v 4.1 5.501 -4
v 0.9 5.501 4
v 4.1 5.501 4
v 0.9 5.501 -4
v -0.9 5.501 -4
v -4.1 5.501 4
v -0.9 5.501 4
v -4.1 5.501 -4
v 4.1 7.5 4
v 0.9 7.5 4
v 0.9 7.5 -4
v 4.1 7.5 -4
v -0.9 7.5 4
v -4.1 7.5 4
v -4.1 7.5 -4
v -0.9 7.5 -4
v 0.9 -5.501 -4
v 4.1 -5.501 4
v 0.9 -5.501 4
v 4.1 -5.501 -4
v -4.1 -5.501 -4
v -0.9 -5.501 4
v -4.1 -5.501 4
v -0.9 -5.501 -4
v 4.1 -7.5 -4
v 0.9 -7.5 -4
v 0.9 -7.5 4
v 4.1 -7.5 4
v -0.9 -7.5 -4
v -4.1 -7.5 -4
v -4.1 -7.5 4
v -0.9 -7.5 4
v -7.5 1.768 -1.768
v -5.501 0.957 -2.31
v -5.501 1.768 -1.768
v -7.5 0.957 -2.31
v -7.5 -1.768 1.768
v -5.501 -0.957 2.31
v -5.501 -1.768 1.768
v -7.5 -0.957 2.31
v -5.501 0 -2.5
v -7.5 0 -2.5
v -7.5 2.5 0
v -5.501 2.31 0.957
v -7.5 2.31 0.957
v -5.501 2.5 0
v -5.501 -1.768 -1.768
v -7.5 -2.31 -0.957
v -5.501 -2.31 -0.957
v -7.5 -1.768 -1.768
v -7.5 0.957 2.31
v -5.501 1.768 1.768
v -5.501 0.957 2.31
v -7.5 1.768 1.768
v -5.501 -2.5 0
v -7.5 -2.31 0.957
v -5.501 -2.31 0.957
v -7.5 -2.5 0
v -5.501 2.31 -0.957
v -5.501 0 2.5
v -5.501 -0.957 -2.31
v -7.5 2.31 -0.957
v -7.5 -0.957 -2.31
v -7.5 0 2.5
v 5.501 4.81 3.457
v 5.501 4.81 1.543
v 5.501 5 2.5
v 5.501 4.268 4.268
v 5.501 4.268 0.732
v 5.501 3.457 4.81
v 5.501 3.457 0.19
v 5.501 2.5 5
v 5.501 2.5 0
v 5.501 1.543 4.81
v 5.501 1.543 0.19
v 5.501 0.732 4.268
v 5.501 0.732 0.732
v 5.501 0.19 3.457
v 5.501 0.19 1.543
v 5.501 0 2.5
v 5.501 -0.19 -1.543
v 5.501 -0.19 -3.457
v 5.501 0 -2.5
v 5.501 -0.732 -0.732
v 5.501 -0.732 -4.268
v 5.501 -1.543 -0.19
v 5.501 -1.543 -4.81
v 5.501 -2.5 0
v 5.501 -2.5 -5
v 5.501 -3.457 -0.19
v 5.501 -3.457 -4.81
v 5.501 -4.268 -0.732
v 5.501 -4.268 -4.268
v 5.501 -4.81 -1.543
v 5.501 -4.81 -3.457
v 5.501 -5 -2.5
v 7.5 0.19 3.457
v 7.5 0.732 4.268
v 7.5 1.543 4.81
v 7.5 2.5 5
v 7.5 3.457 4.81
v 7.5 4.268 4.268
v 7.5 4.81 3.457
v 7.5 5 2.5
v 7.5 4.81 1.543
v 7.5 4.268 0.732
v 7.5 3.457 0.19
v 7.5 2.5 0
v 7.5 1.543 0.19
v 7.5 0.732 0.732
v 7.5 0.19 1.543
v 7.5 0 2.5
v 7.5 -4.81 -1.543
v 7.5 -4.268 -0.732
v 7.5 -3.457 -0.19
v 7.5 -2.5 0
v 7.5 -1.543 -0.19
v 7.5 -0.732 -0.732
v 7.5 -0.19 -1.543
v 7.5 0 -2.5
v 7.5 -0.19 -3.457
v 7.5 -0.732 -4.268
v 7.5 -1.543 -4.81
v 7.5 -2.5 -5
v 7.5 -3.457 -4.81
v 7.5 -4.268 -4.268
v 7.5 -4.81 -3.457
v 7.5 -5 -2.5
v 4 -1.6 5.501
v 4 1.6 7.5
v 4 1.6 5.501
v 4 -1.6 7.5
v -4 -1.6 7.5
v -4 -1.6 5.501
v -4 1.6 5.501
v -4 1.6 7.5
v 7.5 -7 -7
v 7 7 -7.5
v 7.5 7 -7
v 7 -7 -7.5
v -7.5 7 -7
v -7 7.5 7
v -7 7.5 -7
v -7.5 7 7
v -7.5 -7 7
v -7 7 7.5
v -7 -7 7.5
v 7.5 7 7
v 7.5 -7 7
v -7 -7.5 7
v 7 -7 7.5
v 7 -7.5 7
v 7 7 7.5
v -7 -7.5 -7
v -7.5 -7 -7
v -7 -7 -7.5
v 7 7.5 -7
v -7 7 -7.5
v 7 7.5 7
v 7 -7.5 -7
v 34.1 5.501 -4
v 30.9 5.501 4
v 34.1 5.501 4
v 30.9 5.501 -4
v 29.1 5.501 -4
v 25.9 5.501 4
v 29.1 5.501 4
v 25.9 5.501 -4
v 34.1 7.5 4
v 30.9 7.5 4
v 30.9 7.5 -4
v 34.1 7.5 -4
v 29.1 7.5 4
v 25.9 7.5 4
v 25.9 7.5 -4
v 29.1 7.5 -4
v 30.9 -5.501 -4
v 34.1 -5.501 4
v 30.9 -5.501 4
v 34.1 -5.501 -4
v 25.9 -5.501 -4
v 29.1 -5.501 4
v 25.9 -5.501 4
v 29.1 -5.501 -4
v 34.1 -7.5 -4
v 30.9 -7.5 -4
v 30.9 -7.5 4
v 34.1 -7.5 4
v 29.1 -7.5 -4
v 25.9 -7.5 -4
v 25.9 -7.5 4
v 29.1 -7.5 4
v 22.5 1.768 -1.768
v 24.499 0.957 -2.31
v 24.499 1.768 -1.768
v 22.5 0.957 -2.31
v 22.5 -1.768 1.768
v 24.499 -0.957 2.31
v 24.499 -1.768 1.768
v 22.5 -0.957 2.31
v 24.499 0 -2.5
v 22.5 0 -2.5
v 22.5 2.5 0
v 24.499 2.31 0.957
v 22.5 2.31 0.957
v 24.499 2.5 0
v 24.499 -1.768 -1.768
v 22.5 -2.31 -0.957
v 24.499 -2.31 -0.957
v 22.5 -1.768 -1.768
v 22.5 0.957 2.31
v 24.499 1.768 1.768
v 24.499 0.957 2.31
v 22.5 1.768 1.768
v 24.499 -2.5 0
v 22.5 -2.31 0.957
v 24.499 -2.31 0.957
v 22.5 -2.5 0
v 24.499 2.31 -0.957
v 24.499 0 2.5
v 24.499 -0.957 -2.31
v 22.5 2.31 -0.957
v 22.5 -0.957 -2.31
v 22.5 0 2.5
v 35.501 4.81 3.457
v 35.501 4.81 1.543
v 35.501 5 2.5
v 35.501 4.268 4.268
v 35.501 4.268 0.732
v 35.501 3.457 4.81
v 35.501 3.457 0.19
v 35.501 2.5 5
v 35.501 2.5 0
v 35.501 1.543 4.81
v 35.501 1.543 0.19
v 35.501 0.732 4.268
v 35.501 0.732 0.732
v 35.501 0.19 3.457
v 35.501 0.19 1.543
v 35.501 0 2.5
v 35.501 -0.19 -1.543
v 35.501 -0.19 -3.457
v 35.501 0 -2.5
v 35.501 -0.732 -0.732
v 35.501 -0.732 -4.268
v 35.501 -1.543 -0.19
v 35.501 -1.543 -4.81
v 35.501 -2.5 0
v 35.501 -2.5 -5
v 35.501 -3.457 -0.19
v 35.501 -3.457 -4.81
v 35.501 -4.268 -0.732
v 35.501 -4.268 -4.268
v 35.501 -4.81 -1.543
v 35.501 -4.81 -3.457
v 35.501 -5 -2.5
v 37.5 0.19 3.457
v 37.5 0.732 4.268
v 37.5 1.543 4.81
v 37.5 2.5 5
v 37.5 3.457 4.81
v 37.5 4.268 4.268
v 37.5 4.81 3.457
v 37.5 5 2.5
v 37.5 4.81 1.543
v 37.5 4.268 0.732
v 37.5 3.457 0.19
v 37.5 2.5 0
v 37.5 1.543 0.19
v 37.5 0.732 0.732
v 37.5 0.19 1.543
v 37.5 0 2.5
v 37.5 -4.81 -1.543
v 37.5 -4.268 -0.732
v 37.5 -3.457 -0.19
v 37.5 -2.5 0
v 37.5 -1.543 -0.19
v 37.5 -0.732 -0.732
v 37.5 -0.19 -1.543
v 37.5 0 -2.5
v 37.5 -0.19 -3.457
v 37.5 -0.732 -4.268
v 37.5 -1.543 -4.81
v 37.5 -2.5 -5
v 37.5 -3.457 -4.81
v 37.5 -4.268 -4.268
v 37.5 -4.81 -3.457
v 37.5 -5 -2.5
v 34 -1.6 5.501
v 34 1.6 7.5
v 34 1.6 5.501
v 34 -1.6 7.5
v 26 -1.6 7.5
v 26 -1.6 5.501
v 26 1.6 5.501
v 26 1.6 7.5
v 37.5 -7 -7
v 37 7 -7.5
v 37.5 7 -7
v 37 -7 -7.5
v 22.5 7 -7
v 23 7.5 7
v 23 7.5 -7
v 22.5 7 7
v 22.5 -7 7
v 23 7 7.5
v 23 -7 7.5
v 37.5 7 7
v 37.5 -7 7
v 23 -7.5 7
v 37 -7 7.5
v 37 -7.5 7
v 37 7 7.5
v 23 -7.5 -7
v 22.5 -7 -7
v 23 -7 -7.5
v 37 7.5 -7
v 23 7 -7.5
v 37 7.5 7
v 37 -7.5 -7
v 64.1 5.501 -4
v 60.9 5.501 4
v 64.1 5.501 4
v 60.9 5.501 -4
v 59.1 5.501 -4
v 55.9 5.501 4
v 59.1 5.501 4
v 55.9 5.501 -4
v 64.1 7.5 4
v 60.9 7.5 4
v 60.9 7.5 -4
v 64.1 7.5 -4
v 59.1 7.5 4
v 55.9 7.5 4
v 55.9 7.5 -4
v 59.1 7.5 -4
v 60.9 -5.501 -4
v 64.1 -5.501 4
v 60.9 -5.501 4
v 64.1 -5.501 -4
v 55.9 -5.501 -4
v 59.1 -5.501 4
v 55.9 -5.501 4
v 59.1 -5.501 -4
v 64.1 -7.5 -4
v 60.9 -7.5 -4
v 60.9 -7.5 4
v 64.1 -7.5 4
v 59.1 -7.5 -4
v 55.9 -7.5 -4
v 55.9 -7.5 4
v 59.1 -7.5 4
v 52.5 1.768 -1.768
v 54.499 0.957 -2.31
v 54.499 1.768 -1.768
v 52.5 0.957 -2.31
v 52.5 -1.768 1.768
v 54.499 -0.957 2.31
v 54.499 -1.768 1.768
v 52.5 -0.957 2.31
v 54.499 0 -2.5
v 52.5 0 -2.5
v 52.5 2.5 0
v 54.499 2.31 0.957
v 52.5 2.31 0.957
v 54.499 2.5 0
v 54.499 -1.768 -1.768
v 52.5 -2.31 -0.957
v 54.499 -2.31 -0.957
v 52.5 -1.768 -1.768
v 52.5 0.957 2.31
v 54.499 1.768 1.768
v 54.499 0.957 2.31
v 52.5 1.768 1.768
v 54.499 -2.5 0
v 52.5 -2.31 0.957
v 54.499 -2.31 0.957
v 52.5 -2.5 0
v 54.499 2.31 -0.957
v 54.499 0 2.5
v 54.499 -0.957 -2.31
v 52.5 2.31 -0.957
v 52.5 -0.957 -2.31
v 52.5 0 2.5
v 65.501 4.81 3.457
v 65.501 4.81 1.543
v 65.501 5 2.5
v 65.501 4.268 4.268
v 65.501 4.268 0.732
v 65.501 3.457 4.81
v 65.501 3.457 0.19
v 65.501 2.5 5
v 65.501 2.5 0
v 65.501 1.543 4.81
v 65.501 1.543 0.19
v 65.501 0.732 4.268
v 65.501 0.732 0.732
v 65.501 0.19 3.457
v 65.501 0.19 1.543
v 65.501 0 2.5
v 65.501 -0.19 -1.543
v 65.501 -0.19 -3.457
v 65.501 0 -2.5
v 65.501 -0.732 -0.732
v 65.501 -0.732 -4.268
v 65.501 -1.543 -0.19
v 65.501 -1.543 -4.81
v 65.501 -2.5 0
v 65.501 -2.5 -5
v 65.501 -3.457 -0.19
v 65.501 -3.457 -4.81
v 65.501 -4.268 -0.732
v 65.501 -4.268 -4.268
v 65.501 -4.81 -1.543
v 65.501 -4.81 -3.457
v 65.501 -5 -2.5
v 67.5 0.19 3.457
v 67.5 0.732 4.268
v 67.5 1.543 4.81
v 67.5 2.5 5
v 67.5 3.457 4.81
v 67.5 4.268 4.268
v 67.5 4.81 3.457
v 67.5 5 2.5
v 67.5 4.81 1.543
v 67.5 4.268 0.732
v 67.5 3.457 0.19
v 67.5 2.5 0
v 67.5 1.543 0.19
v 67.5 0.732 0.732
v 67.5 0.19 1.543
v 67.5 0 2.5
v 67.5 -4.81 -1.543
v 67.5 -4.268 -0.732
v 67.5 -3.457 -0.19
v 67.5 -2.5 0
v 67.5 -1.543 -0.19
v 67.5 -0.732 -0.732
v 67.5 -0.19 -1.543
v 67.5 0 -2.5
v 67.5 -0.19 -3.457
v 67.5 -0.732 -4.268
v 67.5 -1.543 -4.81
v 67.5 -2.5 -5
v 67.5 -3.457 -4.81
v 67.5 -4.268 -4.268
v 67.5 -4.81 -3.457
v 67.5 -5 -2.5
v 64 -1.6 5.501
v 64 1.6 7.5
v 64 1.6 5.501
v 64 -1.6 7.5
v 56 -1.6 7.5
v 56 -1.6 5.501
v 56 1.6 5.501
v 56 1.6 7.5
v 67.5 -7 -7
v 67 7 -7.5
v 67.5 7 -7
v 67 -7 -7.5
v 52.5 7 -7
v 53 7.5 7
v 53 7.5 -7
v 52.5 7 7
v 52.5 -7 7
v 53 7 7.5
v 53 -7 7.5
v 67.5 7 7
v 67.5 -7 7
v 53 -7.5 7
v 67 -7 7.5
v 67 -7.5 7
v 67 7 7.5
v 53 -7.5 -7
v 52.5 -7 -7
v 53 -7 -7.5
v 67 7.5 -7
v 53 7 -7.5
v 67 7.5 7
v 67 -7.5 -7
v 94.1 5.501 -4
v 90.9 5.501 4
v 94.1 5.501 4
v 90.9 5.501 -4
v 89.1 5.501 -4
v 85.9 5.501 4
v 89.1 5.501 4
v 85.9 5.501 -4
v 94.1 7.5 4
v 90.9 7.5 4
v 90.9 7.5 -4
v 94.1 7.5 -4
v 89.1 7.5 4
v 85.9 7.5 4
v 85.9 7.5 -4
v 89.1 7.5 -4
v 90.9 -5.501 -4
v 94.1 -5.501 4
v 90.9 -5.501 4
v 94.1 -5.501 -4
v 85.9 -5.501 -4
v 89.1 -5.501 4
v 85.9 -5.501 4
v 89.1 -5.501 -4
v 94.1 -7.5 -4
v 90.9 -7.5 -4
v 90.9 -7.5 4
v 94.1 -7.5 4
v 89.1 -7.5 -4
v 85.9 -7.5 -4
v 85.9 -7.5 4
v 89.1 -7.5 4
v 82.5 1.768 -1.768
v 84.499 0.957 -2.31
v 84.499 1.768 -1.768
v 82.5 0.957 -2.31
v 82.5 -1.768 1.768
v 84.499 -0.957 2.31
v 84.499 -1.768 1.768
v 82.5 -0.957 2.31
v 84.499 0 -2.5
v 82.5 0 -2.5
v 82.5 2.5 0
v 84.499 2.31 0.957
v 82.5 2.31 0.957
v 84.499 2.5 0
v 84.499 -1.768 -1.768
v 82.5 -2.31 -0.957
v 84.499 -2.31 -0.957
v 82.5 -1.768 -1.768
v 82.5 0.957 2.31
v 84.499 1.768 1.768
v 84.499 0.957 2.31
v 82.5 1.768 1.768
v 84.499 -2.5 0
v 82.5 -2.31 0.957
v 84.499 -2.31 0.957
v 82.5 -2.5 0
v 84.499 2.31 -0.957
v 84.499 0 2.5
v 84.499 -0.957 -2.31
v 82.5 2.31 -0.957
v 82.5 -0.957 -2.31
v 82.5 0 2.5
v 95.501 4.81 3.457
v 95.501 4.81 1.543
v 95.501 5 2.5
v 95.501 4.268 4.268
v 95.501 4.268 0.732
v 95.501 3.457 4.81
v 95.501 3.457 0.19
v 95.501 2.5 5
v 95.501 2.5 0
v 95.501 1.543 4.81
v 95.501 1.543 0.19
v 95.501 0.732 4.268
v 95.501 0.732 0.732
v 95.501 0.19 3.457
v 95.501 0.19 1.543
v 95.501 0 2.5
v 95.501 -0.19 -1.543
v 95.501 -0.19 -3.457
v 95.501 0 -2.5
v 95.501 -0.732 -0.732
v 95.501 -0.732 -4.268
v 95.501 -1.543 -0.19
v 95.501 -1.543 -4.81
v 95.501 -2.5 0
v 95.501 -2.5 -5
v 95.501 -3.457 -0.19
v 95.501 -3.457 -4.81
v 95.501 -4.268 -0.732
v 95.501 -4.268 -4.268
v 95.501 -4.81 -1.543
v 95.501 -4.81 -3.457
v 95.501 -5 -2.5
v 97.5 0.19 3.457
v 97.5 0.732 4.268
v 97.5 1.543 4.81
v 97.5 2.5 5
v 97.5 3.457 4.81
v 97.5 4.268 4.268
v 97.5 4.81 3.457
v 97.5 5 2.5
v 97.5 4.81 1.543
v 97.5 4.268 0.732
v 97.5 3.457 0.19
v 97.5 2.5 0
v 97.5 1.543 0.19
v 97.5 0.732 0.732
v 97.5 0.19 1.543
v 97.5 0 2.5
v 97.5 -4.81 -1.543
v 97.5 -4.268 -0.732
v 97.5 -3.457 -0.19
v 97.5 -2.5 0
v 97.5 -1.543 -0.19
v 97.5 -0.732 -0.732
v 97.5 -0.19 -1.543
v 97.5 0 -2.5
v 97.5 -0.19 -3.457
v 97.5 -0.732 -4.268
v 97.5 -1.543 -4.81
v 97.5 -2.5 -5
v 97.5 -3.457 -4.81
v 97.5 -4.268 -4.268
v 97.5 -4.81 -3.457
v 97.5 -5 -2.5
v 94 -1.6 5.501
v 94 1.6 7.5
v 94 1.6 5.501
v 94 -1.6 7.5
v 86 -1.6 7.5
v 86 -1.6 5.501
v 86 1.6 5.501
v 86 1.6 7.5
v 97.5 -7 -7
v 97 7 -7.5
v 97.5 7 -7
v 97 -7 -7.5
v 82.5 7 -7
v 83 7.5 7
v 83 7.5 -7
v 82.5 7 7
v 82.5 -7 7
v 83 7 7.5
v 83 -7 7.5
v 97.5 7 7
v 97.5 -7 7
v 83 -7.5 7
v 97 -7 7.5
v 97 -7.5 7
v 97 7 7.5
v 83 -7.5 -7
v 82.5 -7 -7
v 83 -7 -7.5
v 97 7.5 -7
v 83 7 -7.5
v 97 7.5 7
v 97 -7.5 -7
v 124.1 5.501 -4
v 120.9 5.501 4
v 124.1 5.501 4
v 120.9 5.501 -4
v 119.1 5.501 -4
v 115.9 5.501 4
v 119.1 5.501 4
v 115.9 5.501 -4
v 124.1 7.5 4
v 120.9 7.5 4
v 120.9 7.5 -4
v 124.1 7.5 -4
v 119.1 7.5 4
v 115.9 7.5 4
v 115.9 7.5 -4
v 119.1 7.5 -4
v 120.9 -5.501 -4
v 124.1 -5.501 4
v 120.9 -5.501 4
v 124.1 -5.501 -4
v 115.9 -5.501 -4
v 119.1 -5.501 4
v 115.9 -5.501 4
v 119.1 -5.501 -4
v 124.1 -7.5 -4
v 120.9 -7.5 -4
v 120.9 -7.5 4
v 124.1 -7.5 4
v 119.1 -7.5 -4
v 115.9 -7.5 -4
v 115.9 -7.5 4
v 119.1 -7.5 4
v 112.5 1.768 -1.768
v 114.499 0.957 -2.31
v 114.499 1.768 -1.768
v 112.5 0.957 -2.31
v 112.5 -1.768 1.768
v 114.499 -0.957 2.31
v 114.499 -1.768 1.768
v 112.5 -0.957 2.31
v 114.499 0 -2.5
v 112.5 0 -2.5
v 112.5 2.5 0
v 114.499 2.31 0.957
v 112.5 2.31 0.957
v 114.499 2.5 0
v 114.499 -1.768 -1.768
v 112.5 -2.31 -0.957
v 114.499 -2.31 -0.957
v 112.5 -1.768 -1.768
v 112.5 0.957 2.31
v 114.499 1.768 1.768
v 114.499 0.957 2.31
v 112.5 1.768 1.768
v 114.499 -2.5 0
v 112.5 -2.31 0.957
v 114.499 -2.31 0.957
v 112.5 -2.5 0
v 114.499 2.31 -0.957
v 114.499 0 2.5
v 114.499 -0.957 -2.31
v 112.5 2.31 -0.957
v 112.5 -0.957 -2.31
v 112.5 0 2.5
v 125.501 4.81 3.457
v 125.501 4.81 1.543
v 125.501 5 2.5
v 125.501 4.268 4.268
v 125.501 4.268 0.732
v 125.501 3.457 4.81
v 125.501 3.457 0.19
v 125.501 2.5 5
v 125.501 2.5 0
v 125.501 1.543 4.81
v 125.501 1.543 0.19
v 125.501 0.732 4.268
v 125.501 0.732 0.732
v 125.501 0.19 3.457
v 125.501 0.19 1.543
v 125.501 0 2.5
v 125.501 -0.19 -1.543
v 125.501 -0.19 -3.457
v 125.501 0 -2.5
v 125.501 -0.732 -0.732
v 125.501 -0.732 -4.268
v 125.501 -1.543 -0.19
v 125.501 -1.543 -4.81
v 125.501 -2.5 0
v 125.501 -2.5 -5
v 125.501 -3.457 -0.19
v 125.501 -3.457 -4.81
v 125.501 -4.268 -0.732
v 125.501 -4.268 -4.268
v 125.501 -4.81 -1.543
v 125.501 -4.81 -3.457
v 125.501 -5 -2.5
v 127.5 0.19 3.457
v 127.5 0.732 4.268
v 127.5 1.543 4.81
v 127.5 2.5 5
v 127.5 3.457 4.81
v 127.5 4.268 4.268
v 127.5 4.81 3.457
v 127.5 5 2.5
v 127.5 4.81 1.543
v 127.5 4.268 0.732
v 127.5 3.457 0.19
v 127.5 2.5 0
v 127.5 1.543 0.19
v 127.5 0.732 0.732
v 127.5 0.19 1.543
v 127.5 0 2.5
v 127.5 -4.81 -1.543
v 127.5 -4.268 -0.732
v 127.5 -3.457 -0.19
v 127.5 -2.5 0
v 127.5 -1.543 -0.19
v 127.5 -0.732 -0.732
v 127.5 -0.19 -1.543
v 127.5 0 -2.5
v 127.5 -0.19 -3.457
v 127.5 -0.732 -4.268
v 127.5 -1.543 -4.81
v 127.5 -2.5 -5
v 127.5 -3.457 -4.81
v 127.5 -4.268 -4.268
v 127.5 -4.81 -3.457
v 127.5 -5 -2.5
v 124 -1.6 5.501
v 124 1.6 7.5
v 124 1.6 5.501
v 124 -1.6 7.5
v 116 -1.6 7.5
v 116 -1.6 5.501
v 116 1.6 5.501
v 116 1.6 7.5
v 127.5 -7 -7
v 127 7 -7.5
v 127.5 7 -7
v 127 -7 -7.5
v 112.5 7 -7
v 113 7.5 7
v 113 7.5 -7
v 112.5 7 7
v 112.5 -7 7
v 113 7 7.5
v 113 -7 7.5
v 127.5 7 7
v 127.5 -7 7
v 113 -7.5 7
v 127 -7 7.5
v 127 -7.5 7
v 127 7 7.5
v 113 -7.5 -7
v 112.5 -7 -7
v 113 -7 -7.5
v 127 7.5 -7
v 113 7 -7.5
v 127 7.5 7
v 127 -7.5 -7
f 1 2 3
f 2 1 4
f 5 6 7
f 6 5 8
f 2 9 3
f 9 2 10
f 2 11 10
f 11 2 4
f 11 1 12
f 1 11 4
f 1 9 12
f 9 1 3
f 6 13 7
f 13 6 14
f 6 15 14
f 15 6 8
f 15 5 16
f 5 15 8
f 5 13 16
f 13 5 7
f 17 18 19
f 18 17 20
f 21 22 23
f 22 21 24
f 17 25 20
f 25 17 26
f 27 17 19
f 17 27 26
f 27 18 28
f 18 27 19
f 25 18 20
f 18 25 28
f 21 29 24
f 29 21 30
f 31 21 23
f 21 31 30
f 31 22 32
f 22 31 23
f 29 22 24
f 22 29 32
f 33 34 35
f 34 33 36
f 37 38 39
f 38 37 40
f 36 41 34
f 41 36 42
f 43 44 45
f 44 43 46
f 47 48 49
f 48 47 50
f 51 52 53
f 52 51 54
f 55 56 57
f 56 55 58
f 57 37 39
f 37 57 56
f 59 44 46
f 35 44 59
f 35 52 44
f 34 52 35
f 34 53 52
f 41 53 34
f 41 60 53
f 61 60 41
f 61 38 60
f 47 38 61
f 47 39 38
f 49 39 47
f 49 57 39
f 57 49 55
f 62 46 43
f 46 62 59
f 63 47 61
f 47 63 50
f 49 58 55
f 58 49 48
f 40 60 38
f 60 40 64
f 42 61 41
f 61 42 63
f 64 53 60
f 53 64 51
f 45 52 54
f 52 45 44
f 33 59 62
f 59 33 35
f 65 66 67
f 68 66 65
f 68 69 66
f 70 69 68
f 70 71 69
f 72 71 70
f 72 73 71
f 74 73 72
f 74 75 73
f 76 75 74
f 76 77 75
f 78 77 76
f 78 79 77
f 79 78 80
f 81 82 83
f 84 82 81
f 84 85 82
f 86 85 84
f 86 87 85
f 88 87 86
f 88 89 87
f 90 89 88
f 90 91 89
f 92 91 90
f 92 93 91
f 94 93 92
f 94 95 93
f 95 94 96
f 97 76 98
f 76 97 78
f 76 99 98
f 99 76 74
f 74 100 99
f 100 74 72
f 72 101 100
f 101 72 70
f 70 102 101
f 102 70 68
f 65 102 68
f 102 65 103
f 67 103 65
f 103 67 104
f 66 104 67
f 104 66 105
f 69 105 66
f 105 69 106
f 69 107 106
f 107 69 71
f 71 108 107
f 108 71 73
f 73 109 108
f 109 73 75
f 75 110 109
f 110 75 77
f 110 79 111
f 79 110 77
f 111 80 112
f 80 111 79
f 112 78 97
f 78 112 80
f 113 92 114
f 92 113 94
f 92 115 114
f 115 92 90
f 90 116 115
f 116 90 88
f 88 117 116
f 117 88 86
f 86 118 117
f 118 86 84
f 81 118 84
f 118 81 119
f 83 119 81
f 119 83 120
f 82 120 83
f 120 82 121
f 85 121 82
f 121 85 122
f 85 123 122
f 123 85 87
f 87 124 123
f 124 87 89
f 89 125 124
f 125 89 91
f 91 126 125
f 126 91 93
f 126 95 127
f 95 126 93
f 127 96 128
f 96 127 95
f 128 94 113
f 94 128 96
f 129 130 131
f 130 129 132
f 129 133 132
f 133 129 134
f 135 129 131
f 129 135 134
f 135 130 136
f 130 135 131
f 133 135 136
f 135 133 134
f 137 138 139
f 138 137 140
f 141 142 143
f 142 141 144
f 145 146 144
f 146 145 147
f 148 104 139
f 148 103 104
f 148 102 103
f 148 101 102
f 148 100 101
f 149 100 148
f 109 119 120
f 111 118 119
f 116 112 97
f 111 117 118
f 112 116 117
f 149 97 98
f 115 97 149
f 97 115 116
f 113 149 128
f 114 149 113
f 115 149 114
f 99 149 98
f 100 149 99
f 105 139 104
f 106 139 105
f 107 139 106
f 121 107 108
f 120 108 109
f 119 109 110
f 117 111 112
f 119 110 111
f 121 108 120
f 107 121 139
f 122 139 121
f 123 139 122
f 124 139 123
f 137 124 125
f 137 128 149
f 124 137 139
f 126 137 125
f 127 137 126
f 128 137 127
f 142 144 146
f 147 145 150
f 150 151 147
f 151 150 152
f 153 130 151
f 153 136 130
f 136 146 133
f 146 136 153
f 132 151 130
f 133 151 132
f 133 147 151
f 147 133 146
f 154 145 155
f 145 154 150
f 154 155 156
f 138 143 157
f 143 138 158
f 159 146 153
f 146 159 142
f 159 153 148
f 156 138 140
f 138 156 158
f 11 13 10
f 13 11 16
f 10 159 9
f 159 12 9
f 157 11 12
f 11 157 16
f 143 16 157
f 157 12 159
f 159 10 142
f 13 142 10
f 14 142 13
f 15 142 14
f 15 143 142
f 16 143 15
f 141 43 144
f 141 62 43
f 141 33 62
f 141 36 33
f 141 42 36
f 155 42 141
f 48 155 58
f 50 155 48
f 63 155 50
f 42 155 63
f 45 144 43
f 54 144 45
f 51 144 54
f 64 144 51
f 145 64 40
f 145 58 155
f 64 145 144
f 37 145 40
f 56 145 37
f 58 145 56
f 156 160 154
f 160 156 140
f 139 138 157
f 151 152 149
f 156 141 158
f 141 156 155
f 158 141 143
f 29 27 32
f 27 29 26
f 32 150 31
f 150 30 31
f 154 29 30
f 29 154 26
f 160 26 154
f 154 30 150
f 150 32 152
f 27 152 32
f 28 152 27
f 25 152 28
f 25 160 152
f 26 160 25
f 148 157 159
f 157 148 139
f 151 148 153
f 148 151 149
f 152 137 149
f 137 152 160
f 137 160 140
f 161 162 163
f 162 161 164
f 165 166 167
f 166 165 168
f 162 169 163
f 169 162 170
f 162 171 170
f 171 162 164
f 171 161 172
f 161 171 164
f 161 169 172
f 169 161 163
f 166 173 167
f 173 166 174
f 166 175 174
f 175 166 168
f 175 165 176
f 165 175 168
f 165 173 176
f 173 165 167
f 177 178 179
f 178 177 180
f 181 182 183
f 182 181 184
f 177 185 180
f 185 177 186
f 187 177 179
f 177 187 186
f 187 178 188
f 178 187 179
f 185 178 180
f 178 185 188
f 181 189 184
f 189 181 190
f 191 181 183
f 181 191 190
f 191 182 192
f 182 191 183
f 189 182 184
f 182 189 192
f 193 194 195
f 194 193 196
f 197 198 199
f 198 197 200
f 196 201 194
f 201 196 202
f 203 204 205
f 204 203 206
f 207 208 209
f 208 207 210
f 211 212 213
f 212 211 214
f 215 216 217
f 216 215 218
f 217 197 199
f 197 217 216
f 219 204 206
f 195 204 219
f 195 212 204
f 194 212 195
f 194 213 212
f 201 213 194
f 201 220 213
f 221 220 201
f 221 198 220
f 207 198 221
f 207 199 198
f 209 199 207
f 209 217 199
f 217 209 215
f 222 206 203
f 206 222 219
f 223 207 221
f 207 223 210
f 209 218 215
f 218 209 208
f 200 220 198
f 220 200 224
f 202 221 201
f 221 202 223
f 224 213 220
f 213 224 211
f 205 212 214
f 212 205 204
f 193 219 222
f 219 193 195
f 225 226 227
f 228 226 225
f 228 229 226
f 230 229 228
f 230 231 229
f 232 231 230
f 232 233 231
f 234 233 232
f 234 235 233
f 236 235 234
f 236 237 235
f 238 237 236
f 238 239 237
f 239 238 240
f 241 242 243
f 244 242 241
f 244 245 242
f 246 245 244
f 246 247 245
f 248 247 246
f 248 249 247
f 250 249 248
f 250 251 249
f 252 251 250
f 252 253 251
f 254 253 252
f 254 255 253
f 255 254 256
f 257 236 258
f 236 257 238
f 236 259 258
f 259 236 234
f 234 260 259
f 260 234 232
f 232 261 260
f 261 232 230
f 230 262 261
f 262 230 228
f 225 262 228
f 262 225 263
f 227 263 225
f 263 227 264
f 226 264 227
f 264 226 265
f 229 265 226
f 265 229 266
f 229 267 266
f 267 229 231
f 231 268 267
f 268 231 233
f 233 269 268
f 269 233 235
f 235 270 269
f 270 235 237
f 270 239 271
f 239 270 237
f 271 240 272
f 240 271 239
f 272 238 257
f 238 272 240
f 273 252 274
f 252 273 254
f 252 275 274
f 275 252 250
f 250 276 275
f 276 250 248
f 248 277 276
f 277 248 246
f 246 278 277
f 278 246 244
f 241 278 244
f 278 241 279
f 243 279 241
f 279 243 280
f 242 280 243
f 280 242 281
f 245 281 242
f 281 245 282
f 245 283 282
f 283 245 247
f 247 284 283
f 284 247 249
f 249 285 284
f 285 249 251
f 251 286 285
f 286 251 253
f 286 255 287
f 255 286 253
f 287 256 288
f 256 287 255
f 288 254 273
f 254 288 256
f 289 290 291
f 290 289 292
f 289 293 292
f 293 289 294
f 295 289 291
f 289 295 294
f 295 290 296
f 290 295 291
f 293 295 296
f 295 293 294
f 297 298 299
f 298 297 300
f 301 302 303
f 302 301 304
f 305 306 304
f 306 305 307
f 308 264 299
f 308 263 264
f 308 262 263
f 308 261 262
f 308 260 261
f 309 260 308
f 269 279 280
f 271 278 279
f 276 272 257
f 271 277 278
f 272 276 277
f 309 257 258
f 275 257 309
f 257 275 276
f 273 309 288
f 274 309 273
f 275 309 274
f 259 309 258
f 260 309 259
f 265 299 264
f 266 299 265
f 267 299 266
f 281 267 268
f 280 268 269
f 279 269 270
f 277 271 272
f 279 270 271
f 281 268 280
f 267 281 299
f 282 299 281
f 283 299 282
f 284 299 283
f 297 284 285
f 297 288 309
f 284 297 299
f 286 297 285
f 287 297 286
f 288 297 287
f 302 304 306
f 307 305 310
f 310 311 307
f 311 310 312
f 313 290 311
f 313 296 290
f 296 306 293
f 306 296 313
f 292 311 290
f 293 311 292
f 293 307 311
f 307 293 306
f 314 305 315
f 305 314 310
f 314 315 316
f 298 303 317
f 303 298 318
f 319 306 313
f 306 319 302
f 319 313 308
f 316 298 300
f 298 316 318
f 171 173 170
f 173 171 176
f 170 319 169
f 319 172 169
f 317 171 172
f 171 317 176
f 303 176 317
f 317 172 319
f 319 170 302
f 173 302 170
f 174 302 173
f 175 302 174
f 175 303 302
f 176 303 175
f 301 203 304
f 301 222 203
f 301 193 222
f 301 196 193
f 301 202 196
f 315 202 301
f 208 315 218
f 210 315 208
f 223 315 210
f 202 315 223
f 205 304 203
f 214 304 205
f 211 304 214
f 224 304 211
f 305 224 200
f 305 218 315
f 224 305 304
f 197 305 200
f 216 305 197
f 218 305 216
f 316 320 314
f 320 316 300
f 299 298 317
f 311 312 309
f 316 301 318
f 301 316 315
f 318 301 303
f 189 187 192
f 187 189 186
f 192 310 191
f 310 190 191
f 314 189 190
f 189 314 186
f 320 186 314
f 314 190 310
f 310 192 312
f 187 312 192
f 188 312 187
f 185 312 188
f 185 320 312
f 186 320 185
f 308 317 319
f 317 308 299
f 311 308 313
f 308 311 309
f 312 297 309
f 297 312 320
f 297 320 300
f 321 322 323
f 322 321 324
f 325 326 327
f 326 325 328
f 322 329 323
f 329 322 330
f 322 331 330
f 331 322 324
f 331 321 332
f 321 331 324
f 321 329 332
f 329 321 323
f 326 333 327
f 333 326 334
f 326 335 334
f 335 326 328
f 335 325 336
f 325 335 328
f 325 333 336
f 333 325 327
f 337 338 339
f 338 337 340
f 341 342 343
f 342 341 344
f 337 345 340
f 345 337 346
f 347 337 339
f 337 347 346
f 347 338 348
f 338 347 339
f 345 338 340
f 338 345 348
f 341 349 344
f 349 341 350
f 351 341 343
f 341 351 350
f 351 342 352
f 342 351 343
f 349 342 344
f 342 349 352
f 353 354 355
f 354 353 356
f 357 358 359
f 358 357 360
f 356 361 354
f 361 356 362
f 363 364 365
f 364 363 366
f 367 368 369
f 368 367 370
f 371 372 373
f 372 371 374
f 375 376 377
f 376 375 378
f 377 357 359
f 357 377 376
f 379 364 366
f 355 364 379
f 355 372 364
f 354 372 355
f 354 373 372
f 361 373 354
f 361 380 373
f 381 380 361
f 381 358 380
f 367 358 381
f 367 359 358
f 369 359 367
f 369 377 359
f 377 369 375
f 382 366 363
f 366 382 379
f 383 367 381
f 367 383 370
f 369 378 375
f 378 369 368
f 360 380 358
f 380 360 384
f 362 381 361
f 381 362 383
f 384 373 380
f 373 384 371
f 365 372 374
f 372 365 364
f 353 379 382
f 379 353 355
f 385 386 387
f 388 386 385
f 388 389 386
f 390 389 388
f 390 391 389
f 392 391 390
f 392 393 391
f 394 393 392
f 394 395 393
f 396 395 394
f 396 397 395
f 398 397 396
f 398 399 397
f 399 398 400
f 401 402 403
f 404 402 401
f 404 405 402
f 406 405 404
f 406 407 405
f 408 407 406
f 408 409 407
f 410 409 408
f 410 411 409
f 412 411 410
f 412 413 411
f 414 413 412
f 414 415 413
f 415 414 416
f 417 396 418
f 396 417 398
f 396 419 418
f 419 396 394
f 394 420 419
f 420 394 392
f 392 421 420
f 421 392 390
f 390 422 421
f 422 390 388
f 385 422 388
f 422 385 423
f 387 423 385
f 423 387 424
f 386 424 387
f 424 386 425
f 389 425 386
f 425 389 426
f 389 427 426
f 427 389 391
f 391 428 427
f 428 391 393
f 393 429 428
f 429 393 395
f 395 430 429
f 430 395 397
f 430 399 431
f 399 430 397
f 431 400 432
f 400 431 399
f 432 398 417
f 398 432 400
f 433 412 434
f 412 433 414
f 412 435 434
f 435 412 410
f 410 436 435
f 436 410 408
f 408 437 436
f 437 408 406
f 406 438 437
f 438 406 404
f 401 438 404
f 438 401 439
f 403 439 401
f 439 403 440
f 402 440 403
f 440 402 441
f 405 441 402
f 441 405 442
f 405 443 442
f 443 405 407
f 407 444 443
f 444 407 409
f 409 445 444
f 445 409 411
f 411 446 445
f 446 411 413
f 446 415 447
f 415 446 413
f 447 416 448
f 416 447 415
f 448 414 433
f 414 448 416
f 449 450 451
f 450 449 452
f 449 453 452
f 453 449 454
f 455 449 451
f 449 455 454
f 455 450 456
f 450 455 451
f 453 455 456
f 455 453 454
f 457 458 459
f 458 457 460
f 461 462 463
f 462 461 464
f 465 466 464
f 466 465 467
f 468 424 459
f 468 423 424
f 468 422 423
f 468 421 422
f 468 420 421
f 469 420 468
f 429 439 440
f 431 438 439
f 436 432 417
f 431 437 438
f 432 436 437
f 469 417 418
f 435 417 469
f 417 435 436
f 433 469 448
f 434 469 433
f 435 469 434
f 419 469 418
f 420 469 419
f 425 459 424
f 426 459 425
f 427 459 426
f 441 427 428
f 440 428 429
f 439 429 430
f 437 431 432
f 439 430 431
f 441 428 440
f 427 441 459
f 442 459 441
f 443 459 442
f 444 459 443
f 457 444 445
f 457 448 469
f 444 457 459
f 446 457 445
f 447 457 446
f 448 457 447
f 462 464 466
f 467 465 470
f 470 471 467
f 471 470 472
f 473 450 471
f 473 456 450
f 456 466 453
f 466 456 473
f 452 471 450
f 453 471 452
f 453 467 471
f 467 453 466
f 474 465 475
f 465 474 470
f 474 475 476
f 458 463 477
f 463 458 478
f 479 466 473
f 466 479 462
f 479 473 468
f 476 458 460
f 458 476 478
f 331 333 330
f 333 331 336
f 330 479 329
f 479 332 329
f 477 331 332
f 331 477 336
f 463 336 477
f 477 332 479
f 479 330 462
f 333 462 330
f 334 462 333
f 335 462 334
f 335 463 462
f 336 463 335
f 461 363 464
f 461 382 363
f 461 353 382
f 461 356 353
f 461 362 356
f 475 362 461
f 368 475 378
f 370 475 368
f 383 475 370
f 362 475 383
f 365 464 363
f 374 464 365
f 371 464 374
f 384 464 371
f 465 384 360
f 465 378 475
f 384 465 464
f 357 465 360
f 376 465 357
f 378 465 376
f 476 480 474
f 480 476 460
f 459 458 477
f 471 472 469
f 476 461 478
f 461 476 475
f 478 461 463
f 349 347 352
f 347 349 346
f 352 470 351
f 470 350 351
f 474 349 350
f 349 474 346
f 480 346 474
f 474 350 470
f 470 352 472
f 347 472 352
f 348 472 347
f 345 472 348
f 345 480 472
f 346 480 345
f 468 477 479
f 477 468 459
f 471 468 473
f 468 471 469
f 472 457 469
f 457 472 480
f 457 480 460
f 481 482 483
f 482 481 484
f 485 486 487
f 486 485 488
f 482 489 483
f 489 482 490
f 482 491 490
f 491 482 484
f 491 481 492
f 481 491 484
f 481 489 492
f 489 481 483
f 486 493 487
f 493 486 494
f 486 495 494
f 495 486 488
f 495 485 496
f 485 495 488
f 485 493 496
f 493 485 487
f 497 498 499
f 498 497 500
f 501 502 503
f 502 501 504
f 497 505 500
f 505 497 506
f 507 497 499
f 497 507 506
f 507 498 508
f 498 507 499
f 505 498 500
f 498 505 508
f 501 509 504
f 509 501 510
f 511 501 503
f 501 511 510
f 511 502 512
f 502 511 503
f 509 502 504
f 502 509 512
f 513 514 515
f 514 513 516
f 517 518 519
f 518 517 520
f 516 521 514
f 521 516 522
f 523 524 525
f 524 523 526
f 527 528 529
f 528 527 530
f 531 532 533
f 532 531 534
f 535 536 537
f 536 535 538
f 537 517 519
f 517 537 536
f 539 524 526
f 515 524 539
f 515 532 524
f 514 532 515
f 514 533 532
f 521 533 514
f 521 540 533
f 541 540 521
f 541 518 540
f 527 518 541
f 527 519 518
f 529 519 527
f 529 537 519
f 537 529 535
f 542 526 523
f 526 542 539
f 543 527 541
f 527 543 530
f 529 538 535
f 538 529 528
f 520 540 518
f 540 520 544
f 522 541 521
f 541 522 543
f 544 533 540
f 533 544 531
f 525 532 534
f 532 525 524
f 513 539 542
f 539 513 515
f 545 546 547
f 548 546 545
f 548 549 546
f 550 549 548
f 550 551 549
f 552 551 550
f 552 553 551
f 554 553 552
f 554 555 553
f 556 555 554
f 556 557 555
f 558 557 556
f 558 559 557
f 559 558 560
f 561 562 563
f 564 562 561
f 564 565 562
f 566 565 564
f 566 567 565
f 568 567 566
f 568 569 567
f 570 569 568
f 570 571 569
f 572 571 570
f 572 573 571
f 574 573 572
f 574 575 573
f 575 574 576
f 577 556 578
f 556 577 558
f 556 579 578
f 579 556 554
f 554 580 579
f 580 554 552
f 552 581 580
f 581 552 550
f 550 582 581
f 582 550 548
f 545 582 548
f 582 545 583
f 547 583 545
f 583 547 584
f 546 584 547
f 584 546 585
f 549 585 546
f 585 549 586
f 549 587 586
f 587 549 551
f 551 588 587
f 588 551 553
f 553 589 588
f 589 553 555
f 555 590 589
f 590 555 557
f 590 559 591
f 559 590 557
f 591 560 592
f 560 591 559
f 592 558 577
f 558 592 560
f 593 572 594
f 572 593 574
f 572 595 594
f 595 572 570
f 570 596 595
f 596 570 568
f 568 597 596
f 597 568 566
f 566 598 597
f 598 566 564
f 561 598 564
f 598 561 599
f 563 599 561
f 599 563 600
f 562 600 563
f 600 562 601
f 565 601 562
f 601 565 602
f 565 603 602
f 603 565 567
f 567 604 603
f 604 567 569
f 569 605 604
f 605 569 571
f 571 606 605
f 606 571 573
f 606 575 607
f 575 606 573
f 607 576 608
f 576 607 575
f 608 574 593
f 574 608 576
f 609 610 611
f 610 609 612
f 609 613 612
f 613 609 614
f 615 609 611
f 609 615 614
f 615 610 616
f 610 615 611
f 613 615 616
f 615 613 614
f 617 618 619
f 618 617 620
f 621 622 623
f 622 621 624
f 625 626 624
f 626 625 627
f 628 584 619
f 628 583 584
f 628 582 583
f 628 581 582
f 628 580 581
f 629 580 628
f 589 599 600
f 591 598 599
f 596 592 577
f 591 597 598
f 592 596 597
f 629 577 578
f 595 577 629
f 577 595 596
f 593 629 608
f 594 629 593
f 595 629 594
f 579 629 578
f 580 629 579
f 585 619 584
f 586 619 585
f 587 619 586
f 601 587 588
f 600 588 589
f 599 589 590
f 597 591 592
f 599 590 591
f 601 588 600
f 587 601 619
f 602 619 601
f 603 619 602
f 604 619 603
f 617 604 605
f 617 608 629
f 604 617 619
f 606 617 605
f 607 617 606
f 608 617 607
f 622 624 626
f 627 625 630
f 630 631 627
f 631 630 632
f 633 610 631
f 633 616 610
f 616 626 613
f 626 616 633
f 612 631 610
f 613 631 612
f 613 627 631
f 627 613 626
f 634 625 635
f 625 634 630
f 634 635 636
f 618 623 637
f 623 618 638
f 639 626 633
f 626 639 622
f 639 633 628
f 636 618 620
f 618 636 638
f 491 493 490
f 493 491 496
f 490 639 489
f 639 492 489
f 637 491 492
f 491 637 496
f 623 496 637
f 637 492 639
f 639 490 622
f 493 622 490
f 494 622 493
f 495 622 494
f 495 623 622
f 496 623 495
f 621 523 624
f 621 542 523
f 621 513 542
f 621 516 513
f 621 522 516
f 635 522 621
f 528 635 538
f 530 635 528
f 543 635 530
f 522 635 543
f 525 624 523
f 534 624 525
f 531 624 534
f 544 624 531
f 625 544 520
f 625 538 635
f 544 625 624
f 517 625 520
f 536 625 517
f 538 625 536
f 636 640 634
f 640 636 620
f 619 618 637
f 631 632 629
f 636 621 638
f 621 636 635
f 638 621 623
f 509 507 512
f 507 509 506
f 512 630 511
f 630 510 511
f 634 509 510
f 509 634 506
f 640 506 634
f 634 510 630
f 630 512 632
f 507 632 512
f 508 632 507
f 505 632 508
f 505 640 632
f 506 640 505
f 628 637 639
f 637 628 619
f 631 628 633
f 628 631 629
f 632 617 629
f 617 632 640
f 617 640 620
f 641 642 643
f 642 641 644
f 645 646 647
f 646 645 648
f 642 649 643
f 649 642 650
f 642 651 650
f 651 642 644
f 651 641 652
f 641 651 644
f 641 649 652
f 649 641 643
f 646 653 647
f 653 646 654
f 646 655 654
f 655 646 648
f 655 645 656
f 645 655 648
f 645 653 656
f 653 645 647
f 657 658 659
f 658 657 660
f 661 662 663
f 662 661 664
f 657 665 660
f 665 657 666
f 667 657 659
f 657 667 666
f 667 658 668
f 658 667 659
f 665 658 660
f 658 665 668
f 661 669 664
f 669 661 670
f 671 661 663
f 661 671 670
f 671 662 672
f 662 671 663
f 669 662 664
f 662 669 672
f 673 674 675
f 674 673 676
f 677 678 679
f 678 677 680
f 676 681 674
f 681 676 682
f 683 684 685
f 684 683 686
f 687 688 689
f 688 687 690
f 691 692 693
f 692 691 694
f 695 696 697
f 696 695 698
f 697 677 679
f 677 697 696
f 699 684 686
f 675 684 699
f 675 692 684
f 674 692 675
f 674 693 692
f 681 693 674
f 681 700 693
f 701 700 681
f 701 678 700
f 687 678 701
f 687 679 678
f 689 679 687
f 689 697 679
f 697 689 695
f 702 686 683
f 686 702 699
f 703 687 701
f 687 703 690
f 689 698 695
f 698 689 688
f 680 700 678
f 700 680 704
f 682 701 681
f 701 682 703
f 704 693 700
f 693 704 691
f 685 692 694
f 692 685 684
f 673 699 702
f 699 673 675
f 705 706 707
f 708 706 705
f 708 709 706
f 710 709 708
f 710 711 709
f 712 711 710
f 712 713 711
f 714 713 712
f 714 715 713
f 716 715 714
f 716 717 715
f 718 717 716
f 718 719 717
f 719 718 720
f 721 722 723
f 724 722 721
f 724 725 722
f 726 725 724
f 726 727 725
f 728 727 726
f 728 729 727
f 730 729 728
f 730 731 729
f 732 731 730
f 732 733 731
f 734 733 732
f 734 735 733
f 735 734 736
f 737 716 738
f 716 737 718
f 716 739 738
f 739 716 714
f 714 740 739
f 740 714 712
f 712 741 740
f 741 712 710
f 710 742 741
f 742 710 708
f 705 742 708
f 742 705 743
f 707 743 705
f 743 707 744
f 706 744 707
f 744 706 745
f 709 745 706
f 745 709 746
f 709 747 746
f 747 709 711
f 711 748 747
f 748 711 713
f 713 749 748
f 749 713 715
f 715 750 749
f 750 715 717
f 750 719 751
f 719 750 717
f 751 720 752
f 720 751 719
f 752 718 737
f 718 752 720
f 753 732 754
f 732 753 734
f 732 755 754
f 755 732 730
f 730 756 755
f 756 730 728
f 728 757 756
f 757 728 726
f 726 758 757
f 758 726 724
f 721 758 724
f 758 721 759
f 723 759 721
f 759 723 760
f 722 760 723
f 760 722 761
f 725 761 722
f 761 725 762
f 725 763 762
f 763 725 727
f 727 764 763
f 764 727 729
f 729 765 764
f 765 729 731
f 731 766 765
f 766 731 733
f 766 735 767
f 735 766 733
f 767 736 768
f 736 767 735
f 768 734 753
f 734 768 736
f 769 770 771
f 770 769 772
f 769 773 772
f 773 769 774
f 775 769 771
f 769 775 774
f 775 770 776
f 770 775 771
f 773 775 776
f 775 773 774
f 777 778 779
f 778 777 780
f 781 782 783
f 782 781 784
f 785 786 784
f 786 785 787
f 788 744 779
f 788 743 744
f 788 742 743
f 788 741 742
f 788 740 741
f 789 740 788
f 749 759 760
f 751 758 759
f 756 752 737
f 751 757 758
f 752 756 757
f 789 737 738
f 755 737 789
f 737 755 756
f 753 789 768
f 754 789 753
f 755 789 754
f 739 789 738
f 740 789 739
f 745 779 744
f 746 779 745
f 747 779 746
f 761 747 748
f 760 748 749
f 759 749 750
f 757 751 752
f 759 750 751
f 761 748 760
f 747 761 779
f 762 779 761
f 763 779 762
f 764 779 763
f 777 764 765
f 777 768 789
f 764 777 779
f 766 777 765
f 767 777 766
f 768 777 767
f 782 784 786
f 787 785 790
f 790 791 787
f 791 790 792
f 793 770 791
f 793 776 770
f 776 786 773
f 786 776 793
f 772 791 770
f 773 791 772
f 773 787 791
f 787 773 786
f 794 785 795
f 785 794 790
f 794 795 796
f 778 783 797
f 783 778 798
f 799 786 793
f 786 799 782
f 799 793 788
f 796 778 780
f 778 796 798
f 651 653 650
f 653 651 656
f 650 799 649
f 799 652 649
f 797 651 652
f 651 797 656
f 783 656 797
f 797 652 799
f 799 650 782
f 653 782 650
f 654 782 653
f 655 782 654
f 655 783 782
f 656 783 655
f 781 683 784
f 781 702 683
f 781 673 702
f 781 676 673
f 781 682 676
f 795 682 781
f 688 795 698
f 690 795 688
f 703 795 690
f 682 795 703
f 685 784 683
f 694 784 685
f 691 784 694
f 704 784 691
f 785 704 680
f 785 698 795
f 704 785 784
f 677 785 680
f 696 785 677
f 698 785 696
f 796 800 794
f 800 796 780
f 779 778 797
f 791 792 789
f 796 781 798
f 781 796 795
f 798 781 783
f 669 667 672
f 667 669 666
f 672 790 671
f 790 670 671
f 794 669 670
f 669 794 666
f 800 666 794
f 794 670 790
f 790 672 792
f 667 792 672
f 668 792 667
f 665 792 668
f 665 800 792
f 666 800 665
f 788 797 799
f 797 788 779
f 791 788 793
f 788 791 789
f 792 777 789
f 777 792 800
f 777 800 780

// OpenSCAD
// file: common.scad
// Unless otherwise specified, each resulting shape is
// resting on the XY plane, centered on the Z axis.

// A small amount to make sure shapes overlap when needed. This
// is well below the resolution of my 3D printer, so it
// shouldn't affect the final result.
eps = 0.001;

// High quality for printing.
$fa = 5;
$fs = 0.4;

module repeatx(n, spacing) {
  for (i = [1:n])
    translate([(i-1)*spacing, 0, 0])
      children();
}

module repeaty(n, spacing) {
  for (i = [1:n])
    translate([0, (i-1)*spacing, 0])
      children();
}

// A square pyramid, 1mm wide and 0.5mm tall. Each side of
// the base is centered on an axis.
module pyramid() {
  linear_extrude(0.5, scale=0)
    square(1, center=true);
}

// A regular octahedron centered on the origin with its
// vertices on the axes. 'axis' gives its full length along
// each axis.
module octahedron(axis) {
  // Top and bottom halves.
  for (a = [-1, 1])
    scale([1, 1, a])
      // Extrude a square into a pyramid.
      linear_extrude(axis/2, scale=0)
        rotate([0, 0, 45])
          square(norm([axis/2, axis/2]), center=true);
}

// 'd' is the outer dimensions of the box.
module chamfered_box(d, chamfer=0.5) {
  assert(d.x >= chamfer*2);
  assert(d.y >= chamfer*2);
  assert(d.z >= chamfer*2);

  // Raise the result up so it is resting on the XY plane.
  translate([0, 0, d.z/2]) {
    minkowski() {
      // The desired cube, scaled back by the chamfer distance
      // in all directions.
      cube(d - [chamfer*2, chamfer*2, chamfer*2], center=true);
      octahedron(chamfer*2);
    }
  }
}

module chamfered_disk(height, radius) {
  // Chamfer base disks and chips more aggressively.
  chamfer = 1.1;
  assert(radius >= chamfer);
  assert(height >= chamfer*2);

  // Raise the result up so it is resting on the XY plane.
  translate([0, 0, height/2]) {
    minkowski() {
      // The desired disk, scaled back by the chamfer distance
      // in all directions.
      cylinder(height-chamfer*2, r=radius-chamfer, center=true);
      
      // A pair of cones.
      for (a = [-1, 1])
        scale([1, 1, a])
          linear_extrude(chamfer, scale=0)
            circle(chamfer);
    }
  }
}

locking_lug_dims = [2.3, 2.3, 1.8+2*eps];

// A snug fit for gluing.
module locking_lug() {
  // Taper the lug slightly, to counteract the printing effect
  // which spreads the top layer slightly.
  linear_extrude(locking_lug_dims.z, scale=0.95)
    square([locking_lug_dims.x, locking_lug_dims.y],
            center=true);
}

// Make extra sure the lug will fit all the way into the hole.
locking_socket_extra_depth = 0.7;

module locking_socket_top() {
  extra_depth = 0.15;
  translate([
    0, 0,
    -(
       locking_lug_dims.z+locking_socket_extra_depth+extra_depth
    )/2+eps
  ]) {
    cube(locking_lug_dims + [
      0.15, 0.15,
      locking_socket_extra_depth+extra_depth
    ], center=true);
  }
}

module locking_socket_bottom() {
  translate([
    0, 0,
    (locking_lug_dims.z+locking_socket_extra_depth)/2-eps
  ]) {
    cube(locking_lug_dims + [
      // When printing this on the bottom of a model, it
      // needs to be a bit wider to account for
      // elephant-foot.
      0.3, 0.3,
      locking_socket_extra_depth
    ], center=true);
  }
}

// A pin which can be used to join two locking sockets.
module locking_pin() {
  dims = [
    locking_lug_dims.x-0.2,
    // Lay the pin on its side for more reliable printing.
    locking_lug_dims.z*2 + locking_socket_extra_depth/2,
    locking_lug_dims.y-0.2,
  ];
  translate([0, 0, dims.z/2]) {
    difference() {
      cube(dims, center=true);
      
      // A slight bottom chamfer to combat elephant-foot.
      for (a = [-1, 1])
        scale([a, 1, 1])
          translate([dims.x/2, -eps, -dims.z/2-1.3])
            rotate([0, 45, 0])
              cube([dims.x, dims.y+3*eps, dims.z], center=true);
    }
  }
}

// Arranges children in square pattern.
module arrange(spacing) {
  s = ceil(sqrt($children));
  for (a = [0:s-1], b = [0:s-1]) {
    c = a + b*s;
    x = a - s/2 + 0.5;
    y = b - s/2 + 0.5;
    if (c < $children)
      translate([x*spacing, y*spacing, 0])
        children(c);
  }
}
// main file
include <common.scad>

// When printing, use 80% fill with the "lines" pattern.

// A standard size die is 15mm.
//
// Models in this file are centered on the origin.

module square_die_blank() {
  translate([0, 0, -7.5])
    chamfered_box([15, 15, 15]);
}

// Accepts six 2-D children for the six die faces.
module die_imprint() {
  // An engrave depth of 1 yielded a very clean print, but
  // the symbols were hard to see.
  engrave_depth = 2;

  for (case = [
    [0, [0, 0, 1]],  
    [1, [1, 0, 0]],  
    [2, [-1, 0, 0]],  
    [3, [0, 1, 0]],  
    [4, [0, -1, 0]],  
    [5, [0, 2, 1]],  
  ])
    rotate(case[1]*90)
      translate([0, 0, -7.5-eps])
        linear_extrude(engrave_depth)
          children(case[0]);
}

// I tried printing actual sword and star icons, but worried
// that their detail would get messed up with deeper
// envgravings. So instead I have chosen idealized symbols
// which should be bridgable. These new shapes align better
// with the die shapes anyway (circles and squares).

module one_sword() {
  scale([1.6, 4, 2]) {
    polygon([
      [-1, -1],
      [-1, 1],
      [1, 1],
      [1, -1],
    ]);
  }
}

module two_swords() {
  for (a = [-1, 1])
    translate(a * [-2.5, 0, 0])
      scale([a, 1, 1])
        one_sword();
}

module one_star() {
  scale(2.5 * [1, 1, 1]) {
    circle(1);
  }
}

module two_stars() {
  for (a = [-1, 1])
    translate(a * [-2.5, -2.5, 0])
      one_star();
}

module empty() {}

// Used for prototyping 2D shapes.
module backdrop() {
  color("purple")
    translate([0, 0, -2])
      linear_extrude(1)
        circle(7);
}

module square_die() {
  difference() {
    square_die_blank();

    die_imprint() {
      empty();
      two_swords();
      two_swords();
      one_star();
      two_stars();
      one_sword();
    }
  }
}

module rounded_die() {
  difference() {
    intersection() {
      square_die_blank();
      sphere(10.4);
    }
    
    die_imprint() {
      one_star();
      two_swords();
      // Reflect this one to make the die look nice.
      scale([-1, 1, 1]) two_stars();
      two_stars();
      two_stars();
      one_sword();
    }
  }
}


// Demo.
repeatx(5, 30)
  square_die();
